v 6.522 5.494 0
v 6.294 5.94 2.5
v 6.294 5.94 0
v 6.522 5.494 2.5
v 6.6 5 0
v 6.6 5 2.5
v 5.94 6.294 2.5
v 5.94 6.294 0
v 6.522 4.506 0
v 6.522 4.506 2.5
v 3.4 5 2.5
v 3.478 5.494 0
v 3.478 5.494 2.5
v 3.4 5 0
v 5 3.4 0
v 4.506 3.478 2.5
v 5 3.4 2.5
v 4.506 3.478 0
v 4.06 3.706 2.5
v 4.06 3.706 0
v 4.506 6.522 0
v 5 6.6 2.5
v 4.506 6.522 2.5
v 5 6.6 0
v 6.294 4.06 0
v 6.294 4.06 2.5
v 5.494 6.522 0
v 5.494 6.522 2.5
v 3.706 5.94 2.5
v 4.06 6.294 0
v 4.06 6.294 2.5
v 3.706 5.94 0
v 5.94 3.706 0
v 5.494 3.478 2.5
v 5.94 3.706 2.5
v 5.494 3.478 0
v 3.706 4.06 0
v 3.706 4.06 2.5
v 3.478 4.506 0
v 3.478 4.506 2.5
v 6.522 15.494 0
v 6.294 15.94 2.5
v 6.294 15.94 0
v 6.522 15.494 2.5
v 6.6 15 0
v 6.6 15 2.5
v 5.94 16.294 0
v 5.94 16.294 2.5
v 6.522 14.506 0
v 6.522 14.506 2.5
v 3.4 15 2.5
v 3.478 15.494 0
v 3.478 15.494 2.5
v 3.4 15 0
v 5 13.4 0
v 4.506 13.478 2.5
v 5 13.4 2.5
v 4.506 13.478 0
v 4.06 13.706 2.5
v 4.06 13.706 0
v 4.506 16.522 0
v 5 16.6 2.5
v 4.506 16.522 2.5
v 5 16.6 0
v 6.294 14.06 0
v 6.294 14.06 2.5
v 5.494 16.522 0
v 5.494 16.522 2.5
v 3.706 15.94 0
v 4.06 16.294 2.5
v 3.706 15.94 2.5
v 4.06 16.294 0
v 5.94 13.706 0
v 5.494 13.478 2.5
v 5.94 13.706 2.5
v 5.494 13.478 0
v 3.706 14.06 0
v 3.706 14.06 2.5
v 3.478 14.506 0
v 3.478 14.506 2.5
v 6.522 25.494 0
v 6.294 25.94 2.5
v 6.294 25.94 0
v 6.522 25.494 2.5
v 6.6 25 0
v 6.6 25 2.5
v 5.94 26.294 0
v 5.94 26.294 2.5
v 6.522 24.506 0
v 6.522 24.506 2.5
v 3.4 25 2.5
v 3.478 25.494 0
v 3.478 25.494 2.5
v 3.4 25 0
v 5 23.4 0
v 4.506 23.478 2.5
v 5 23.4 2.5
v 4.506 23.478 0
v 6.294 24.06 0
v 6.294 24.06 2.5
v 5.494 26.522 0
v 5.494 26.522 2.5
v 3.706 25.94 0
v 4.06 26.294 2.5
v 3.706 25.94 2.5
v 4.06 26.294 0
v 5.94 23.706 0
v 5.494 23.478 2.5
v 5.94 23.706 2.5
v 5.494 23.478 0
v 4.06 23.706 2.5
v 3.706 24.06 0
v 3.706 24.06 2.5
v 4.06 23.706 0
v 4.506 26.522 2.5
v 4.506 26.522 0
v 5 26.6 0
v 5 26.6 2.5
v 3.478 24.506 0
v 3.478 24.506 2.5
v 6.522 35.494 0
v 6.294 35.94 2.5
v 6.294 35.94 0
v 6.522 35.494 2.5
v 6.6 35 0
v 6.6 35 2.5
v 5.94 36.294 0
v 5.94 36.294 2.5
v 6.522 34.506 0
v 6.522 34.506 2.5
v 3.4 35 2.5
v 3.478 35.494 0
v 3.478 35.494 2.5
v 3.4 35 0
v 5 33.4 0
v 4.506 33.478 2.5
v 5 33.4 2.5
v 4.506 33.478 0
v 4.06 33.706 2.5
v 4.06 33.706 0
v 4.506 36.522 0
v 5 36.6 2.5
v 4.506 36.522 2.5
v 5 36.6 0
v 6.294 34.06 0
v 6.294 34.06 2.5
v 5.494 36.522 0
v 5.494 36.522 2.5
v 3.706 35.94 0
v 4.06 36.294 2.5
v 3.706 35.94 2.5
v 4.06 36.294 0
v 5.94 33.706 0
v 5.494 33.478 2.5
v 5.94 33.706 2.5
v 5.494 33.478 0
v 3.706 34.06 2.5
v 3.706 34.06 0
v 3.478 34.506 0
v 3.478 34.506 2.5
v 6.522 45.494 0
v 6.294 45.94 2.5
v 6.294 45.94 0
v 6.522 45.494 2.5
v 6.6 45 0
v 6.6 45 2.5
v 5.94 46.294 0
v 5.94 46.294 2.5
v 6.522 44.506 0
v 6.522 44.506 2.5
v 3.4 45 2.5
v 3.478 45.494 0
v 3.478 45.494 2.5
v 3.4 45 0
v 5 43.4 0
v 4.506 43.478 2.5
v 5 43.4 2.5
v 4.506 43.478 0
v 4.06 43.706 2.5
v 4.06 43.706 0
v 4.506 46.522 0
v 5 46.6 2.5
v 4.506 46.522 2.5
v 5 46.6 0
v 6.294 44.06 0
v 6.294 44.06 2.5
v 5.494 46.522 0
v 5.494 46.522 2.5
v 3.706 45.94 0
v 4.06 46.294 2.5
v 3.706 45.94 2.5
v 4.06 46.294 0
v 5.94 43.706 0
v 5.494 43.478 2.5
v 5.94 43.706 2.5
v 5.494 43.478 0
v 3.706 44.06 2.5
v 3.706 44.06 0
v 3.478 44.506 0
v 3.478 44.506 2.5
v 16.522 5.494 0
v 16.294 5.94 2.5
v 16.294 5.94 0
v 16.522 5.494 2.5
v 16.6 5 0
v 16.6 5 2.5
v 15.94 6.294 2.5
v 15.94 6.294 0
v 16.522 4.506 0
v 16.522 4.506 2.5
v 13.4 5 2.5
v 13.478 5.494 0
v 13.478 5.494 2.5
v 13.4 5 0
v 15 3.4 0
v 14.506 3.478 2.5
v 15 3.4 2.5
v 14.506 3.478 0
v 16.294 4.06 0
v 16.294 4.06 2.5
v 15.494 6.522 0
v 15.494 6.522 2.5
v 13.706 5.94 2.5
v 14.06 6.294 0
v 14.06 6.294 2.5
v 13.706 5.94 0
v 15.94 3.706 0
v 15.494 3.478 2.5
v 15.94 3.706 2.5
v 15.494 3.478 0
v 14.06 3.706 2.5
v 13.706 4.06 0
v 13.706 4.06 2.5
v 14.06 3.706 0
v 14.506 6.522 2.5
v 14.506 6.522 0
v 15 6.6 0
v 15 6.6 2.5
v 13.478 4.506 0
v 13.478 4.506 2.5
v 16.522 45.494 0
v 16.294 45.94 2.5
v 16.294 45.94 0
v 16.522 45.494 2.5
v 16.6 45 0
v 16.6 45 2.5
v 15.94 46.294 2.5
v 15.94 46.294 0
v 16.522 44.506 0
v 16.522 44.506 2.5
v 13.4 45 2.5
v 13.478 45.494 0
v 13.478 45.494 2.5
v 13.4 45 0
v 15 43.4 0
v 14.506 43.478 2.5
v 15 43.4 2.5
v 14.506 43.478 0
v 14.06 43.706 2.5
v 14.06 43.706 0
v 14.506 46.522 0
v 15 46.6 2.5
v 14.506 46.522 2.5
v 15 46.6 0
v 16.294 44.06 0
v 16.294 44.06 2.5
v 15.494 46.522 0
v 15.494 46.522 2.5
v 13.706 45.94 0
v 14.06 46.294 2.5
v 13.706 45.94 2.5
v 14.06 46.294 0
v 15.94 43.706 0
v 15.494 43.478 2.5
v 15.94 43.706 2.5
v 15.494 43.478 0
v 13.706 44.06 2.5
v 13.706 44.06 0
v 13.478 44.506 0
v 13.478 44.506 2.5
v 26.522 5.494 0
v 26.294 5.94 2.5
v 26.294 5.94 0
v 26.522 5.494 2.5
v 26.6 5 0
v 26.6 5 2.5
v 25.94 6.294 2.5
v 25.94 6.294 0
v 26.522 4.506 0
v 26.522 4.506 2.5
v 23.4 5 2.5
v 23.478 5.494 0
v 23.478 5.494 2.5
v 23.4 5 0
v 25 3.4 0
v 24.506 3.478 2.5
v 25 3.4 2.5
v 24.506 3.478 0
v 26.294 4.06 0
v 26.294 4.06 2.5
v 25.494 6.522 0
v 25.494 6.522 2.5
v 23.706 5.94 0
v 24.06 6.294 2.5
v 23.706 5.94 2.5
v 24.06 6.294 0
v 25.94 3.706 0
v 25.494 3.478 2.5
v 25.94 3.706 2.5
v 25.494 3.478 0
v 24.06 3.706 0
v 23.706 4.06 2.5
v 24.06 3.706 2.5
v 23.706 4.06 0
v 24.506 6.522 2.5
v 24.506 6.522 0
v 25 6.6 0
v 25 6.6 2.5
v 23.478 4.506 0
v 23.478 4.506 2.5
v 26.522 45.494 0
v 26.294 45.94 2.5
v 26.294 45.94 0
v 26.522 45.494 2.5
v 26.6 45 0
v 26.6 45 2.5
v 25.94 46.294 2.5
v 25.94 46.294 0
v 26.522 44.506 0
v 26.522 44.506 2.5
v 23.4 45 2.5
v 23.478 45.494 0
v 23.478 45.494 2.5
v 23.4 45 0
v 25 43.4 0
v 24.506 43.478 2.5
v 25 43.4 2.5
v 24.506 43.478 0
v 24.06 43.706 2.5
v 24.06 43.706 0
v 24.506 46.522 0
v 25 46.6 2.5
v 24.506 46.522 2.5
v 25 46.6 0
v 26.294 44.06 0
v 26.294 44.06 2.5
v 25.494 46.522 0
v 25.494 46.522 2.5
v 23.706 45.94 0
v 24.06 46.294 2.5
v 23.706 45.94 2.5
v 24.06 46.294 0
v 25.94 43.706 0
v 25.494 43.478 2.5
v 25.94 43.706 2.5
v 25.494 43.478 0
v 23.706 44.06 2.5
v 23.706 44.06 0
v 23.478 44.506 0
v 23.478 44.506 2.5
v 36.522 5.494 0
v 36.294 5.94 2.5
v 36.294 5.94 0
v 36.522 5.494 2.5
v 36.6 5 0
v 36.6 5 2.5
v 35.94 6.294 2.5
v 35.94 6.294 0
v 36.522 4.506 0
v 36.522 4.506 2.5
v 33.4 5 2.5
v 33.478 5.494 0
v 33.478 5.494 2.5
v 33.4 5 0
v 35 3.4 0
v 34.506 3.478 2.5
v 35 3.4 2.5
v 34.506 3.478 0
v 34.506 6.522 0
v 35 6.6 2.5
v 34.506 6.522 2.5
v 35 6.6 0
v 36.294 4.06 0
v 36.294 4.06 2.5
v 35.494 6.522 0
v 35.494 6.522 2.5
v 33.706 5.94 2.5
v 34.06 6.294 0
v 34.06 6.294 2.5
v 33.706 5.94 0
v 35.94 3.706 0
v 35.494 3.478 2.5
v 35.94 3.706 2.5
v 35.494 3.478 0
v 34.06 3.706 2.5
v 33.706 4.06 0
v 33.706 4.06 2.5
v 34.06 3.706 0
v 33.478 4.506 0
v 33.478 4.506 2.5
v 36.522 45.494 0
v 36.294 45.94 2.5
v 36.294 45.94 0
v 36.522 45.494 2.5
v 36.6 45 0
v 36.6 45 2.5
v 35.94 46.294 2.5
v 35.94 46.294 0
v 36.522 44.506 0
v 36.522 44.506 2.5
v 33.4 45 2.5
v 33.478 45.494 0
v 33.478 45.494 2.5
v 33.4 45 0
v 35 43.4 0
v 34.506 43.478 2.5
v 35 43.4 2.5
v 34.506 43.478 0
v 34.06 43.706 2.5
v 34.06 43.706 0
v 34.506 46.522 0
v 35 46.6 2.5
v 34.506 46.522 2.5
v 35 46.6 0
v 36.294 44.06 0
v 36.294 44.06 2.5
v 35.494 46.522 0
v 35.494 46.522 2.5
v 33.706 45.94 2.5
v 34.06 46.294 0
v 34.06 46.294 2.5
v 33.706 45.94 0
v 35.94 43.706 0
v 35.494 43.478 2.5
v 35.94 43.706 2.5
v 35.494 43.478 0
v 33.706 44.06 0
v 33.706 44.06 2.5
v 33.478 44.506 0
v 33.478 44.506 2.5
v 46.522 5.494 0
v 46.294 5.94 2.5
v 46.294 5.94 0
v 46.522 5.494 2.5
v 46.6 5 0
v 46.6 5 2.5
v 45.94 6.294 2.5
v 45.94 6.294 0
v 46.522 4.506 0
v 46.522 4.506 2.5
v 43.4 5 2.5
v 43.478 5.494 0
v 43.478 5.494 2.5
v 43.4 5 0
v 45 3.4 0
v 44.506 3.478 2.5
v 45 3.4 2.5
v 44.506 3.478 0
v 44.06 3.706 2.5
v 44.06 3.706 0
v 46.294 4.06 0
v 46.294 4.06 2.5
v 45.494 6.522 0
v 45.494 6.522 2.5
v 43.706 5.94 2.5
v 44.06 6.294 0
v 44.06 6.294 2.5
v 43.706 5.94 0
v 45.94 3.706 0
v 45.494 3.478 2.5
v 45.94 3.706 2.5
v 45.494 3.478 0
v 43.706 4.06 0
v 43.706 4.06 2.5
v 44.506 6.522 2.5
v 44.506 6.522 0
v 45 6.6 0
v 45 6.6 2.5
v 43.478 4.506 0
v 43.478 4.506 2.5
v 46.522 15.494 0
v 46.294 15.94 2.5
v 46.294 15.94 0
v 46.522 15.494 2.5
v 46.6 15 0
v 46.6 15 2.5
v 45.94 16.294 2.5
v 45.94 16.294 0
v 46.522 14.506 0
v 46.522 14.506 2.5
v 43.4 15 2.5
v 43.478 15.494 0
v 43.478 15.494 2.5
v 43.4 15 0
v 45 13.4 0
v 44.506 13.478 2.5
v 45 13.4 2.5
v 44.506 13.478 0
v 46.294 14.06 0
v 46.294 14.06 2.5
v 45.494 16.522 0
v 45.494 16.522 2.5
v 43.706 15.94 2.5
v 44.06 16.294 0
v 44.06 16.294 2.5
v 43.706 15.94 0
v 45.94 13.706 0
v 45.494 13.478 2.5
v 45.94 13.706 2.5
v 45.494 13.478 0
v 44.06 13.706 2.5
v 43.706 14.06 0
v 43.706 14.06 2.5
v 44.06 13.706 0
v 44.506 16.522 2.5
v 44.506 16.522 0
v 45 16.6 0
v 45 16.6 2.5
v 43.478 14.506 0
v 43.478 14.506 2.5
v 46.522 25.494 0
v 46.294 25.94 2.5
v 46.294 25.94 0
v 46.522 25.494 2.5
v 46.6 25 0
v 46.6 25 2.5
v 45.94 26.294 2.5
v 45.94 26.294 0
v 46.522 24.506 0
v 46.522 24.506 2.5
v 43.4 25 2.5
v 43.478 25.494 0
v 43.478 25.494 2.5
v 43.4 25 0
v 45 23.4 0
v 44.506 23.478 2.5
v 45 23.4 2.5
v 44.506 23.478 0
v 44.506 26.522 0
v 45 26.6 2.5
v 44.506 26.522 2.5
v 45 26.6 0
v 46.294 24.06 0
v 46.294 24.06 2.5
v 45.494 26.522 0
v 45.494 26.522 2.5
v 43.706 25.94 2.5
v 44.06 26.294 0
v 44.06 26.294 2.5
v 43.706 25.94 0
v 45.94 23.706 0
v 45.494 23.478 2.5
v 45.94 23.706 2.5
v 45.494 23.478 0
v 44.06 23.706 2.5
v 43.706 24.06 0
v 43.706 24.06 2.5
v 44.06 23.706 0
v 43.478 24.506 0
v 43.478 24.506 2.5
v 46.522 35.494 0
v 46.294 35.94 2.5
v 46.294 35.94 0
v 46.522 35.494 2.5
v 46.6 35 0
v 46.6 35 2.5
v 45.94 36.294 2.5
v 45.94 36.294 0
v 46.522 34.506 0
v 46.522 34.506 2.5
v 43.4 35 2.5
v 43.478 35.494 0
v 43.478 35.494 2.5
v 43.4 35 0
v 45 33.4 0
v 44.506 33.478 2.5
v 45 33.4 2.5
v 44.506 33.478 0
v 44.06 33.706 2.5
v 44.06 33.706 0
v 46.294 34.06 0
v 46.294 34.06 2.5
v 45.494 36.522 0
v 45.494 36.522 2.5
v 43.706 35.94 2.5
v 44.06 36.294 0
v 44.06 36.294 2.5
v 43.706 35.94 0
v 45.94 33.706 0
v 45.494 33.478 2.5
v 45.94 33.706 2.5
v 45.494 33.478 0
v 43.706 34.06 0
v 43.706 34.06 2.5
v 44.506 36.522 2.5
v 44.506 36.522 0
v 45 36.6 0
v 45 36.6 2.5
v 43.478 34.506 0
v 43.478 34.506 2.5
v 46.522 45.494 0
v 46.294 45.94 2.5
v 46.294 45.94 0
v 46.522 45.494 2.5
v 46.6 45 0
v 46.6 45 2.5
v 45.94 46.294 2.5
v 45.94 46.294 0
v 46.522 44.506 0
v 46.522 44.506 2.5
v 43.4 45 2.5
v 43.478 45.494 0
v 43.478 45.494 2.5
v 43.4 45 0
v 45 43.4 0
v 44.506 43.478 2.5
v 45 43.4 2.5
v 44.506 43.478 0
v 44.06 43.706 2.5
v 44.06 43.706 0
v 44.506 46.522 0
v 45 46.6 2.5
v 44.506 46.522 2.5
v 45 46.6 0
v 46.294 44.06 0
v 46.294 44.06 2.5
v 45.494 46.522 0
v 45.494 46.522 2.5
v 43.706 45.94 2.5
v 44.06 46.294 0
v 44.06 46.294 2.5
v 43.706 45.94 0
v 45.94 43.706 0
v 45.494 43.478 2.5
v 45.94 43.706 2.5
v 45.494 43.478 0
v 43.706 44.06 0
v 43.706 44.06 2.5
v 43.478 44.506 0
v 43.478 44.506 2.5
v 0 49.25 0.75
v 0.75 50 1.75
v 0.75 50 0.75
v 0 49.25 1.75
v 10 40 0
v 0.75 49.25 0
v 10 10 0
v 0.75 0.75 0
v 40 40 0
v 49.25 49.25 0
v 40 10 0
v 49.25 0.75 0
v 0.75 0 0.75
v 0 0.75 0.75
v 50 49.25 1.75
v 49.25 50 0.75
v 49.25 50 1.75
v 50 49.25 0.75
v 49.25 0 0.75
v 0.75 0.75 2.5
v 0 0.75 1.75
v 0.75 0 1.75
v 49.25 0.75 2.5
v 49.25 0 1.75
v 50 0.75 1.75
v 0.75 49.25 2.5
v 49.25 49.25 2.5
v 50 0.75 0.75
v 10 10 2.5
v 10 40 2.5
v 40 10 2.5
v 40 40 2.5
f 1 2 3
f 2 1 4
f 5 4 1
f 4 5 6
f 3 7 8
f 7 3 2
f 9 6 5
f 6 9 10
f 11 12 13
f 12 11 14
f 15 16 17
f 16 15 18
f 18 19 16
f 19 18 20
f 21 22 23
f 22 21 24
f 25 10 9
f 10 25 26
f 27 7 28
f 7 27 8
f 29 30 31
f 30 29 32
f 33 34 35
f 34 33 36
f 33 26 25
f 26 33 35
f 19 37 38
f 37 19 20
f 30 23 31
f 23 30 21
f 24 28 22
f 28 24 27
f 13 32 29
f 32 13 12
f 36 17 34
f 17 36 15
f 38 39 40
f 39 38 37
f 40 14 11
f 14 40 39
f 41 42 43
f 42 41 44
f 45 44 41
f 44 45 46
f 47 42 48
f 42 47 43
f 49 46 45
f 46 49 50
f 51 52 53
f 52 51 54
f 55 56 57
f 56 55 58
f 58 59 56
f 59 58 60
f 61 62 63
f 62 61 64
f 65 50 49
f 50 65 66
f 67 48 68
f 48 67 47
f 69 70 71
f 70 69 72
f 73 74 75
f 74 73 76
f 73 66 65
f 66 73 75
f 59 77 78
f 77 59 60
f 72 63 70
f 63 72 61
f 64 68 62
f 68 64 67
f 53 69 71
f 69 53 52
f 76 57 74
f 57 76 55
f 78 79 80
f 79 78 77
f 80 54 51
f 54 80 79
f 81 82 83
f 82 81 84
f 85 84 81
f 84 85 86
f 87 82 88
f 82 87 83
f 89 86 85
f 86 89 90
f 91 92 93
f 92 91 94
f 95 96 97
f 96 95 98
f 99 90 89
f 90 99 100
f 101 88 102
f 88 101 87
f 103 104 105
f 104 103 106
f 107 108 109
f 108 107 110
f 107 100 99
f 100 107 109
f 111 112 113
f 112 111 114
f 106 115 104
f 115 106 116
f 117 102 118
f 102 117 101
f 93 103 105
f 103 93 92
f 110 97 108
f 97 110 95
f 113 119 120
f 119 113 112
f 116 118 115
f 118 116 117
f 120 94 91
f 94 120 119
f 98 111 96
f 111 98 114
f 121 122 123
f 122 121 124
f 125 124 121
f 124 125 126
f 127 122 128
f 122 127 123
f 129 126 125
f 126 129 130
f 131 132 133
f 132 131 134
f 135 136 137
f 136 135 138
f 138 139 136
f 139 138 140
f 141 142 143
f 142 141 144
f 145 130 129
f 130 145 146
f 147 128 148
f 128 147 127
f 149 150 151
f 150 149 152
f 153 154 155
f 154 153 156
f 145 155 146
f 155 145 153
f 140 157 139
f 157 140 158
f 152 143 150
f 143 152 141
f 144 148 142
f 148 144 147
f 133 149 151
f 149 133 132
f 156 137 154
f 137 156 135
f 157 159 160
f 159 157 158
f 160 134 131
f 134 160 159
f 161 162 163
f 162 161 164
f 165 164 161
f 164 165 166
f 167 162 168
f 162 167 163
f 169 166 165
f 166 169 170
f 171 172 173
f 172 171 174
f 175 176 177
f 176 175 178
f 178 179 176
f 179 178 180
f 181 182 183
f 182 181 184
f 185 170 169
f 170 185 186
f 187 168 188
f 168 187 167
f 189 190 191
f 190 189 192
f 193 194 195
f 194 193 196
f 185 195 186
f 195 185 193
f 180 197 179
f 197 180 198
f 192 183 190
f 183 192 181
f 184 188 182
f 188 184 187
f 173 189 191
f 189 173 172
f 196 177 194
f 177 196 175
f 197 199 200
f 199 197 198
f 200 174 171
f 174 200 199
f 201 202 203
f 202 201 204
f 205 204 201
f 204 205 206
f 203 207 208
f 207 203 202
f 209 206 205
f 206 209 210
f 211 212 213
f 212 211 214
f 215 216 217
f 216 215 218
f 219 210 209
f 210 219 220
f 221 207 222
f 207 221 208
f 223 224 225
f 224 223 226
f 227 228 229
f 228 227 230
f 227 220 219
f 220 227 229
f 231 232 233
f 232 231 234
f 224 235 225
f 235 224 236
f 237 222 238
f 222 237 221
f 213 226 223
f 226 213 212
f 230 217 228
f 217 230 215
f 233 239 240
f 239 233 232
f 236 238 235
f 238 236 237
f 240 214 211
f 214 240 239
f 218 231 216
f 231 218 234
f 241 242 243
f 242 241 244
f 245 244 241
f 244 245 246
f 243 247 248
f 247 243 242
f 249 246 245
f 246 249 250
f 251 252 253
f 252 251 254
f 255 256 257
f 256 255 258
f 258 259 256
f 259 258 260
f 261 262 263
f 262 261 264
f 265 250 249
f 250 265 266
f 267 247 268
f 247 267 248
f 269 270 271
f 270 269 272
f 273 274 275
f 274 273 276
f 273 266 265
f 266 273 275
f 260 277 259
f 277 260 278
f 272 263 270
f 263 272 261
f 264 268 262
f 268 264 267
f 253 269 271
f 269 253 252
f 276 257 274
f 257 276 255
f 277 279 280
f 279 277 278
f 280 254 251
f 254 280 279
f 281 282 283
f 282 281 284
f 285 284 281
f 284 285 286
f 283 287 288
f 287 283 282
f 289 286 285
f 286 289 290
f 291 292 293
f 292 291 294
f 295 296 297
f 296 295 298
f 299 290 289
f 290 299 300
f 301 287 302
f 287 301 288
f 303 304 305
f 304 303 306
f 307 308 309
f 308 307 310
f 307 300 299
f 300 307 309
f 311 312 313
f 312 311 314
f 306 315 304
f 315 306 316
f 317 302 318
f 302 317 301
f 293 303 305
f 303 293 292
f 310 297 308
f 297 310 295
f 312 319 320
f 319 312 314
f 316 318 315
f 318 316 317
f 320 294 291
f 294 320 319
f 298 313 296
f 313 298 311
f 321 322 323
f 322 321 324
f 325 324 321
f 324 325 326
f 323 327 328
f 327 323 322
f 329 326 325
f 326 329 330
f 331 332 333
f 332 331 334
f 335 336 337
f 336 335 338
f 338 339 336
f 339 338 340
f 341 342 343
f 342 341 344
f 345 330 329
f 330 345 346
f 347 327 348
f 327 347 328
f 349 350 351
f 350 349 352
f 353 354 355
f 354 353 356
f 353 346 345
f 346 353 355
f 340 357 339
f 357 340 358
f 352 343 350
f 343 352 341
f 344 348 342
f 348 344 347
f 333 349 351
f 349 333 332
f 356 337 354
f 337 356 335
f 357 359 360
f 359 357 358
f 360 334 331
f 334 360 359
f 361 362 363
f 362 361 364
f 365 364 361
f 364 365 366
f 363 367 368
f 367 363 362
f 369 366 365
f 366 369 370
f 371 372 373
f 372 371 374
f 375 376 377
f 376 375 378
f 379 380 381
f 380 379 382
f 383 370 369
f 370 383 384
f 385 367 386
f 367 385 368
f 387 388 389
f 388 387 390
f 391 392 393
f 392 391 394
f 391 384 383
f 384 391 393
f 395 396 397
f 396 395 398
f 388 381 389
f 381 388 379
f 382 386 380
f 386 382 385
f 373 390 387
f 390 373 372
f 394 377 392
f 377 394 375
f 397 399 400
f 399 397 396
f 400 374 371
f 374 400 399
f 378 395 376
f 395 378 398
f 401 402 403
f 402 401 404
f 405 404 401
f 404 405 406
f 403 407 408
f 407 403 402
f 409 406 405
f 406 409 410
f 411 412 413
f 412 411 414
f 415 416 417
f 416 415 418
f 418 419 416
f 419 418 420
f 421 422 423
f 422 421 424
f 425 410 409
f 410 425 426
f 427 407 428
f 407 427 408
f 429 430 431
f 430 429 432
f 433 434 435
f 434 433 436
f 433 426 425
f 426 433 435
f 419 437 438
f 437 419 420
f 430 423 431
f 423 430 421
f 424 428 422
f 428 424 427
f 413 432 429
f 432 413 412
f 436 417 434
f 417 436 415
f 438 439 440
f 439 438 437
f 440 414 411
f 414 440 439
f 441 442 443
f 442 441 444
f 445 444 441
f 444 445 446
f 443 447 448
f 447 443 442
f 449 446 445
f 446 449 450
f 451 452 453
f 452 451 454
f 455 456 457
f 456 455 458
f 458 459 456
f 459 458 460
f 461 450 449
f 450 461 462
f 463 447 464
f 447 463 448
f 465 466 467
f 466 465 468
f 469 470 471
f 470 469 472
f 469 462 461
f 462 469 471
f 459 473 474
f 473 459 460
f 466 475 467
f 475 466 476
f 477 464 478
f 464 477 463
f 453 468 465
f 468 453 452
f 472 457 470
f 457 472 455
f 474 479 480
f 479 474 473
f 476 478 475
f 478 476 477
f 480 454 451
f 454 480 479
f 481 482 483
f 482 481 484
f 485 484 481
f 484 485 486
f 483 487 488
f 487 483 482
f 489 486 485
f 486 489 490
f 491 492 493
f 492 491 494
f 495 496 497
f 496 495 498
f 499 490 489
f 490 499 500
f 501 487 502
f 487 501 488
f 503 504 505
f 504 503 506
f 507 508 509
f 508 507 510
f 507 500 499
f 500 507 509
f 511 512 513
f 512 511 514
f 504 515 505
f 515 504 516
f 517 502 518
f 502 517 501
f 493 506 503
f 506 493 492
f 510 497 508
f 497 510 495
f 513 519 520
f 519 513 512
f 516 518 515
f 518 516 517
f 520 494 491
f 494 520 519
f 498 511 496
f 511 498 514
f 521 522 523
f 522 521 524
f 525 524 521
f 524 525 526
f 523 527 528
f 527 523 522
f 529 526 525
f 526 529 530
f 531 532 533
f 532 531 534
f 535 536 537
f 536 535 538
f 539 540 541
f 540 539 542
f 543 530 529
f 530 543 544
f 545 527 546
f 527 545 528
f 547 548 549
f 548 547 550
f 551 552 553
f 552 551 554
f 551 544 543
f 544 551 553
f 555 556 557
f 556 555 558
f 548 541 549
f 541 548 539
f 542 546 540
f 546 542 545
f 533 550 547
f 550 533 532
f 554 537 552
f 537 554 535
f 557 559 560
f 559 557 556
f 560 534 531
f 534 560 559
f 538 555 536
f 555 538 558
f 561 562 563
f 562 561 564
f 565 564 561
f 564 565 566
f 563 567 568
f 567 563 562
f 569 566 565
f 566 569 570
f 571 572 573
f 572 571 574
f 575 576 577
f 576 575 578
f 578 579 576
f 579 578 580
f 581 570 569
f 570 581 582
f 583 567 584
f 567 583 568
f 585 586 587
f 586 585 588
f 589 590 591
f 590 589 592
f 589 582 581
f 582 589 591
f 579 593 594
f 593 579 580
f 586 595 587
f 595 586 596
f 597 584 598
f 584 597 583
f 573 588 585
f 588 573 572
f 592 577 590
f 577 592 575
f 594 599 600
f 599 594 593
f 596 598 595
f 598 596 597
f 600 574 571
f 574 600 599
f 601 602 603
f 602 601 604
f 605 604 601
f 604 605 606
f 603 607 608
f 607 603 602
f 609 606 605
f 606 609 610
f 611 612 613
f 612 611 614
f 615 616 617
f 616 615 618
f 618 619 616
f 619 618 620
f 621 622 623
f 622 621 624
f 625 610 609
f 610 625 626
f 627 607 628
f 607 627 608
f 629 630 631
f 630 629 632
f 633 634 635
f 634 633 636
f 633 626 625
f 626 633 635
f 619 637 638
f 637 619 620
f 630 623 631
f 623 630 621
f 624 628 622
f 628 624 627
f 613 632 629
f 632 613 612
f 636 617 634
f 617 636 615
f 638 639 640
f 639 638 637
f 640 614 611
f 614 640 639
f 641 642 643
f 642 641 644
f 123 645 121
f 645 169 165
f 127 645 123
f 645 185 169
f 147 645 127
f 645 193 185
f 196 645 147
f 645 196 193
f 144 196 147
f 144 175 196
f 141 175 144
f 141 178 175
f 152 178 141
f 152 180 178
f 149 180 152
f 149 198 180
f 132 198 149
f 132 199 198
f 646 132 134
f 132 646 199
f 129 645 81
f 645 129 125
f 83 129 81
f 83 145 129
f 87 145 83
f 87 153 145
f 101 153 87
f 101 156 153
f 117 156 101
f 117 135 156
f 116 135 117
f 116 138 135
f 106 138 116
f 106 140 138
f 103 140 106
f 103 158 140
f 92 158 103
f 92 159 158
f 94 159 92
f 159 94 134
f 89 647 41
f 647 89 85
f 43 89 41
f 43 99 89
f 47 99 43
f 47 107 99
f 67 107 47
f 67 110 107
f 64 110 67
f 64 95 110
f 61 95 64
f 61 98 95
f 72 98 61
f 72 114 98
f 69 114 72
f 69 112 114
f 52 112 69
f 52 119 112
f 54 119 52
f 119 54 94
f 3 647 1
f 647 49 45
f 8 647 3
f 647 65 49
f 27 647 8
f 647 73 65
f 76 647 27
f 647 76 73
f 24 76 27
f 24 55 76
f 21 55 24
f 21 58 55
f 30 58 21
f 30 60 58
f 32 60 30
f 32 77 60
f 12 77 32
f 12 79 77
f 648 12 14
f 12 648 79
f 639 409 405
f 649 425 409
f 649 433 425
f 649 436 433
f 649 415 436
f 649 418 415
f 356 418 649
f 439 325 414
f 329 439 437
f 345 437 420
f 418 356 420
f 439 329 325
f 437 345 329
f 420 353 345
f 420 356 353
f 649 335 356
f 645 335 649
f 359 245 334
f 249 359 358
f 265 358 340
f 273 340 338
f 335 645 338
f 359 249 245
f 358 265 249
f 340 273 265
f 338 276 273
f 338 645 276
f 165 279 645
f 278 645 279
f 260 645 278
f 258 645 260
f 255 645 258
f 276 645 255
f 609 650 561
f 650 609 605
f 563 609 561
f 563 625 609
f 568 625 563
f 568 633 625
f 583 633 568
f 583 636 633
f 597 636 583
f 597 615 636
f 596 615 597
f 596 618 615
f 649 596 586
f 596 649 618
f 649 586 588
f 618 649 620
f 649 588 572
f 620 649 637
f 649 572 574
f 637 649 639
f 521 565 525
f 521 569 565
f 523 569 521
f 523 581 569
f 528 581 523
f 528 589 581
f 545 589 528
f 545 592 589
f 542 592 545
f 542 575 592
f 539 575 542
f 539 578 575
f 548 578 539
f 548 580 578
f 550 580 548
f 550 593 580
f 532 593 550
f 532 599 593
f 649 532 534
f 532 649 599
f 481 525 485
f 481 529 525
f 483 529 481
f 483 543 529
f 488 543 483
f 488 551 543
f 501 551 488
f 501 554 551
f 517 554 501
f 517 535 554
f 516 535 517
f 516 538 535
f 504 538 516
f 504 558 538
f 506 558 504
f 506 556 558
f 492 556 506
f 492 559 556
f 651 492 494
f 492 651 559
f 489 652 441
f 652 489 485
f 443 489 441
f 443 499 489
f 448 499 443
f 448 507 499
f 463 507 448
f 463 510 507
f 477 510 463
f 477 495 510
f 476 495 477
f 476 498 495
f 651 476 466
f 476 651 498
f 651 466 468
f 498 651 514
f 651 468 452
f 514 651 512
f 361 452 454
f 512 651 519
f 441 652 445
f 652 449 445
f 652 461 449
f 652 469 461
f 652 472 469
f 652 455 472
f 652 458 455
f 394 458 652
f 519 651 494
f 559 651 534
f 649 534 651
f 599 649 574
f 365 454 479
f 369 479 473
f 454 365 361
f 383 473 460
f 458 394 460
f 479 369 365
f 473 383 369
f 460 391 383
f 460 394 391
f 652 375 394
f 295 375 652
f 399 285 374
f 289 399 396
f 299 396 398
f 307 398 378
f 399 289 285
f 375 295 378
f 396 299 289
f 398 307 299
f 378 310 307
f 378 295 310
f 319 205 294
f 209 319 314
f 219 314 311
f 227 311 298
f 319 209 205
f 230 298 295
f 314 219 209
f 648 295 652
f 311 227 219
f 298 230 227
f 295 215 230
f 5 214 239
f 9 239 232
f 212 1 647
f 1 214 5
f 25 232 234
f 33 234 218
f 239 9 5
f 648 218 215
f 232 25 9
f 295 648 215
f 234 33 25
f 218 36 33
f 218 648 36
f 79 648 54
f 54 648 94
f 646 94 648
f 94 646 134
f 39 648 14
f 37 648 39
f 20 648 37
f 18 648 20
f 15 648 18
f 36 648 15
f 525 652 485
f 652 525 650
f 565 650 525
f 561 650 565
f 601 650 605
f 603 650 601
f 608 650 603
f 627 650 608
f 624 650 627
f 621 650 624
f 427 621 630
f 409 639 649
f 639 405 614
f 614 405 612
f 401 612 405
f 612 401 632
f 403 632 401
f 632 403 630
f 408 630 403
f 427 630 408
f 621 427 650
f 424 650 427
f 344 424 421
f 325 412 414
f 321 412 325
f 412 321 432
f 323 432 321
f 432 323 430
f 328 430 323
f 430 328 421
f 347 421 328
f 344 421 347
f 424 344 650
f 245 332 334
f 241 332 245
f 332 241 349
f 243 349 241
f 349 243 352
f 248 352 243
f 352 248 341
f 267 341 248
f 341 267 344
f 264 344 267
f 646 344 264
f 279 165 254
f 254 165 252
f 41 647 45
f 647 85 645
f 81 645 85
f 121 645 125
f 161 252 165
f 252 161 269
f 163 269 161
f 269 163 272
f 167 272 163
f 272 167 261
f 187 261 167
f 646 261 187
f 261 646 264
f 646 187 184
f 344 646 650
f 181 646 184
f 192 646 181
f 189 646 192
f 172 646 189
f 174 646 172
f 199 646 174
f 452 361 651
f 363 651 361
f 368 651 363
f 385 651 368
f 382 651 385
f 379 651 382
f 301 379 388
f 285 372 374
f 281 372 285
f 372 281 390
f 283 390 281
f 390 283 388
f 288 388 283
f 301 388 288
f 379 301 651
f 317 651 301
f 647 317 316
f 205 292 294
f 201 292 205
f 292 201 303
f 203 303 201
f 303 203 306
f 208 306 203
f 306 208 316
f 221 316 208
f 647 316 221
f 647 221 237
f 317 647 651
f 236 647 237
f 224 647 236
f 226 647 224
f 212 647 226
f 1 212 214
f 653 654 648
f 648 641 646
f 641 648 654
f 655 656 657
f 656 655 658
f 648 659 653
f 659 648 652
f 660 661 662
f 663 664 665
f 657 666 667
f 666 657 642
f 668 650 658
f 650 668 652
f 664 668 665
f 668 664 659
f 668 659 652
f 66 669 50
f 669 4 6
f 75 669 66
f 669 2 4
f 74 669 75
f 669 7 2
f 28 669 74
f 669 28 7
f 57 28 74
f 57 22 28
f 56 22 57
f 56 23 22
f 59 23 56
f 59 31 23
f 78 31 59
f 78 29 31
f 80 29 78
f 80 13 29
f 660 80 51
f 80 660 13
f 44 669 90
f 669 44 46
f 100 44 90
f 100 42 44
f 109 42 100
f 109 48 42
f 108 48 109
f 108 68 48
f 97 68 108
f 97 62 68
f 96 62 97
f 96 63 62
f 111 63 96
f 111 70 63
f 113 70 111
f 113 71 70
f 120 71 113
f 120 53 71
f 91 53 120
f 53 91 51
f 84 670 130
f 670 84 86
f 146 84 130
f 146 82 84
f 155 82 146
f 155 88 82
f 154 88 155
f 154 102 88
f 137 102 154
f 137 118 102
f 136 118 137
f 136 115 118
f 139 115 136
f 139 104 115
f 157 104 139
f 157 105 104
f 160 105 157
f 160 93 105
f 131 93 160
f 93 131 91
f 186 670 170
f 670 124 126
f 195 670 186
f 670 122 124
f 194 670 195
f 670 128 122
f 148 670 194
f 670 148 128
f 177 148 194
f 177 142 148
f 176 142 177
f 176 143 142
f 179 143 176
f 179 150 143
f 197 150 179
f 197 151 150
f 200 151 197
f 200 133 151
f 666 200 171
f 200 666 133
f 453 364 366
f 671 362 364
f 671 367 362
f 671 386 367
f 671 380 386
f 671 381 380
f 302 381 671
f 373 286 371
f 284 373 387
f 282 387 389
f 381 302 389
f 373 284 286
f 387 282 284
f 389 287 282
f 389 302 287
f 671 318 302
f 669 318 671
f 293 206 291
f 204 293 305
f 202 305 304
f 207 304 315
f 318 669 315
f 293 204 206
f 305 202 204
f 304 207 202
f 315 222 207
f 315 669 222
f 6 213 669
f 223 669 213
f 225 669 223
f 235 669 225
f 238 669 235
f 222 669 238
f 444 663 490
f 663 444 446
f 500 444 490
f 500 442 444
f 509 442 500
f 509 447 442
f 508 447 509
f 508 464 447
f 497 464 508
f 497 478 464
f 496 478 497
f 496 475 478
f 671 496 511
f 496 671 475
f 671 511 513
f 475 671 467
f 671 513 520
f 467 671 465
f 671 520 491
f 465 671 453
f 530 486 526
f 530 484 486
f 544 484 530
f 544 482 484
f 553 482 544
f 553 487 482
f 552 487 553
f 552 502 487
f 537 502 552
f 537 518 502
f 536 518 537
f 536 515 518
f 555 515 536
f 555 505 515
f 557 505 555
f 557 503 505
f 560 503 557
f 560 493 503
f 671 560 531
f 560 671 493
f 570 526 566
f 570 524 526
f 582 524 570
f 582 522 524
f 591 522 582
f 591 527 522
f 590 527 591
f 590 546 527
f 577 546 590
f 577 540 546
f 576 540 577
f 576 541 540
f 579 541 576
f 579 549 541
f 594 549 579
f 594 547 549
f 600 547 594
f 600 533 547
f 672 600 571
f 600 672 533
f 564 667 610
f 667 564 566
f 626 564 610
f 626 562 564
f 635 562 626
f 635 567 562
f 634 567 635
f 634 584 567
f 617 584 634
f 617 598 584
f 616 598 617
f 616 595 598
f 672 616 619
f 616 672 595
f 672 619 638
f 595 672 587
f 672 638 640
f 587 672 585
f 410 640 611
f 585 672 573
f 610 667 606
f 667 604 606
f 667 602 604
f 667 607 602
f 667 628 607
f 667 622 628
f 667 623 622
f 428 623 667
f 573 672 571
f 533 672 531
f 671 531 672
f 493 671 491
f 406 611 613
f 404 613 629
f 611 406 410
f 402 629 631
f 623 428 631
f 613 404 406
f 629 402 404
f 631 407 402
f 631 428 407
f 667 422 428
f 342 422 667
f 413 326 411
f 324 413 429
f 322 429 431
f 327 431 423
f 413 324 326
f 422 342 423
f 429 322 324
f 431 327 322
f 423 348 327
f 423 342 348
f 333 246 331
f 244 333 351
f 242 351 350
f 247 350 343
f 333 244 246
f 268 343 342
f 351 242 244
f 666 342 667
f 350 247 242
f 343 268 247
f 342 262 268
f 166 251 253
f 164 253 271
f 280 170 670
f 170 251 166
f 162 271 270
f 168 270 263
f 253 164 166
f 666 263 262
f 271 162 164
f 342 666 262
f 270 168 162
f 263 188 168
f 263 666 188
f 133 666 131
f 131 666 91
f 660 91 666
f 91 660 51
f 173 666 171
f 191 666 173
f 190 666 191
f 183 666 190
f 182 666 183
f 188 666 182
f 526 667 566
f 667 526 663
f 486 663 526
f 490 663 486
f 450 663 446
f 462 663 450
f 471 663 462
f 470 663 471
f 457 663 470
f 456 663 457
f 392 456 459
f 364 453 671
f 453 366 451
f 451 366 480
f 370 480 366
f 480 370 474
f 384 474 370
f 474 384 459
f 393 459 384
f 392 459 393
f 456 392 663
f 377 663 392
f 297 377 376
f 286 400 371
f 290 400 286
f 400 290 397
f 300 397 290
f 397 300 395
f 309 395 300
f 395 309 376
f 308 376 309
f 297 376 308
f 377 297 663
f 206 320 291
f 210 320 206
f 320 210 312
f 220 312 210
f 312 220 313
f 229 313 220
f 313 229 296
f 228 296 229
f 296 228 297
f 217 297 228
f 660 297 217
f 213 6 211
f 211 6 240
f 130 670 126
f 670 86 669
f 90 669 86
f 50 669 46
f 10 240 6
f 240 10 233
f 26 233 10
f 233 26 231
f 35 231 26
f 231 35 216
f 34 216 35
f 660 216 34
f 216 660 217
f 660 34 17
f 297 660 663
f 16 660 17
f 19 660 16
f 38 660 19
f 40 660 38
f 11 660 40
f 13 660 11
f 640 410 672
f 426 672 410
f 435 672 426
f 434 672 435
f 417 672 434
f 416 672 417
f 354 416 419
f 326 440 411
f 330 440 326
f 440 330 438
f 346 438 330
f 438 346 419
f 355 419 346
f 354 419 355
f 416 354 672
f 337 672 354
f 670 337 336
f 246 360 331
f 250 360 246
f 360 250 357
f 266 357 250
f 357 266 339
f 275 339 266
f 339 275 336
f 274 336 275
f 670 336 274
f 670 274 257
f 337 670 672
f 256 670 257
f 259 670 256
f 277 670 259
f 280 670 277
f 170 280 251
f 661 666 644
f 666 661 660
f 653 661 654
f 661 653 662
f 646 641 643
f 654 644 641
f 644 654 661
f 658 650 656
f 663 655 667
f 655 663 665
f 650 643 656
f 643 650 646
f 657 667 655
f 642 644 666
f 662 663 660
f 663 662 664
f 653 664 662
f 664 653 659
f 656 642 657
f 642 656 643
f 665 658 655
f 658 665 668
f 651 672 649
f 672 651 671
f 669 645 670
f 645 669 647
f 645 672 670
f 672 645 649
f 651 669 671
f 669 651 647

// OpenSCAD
/*  
        Flat.scad
        M3Z core library 1.0.0
*/

//BEGIN OPTIONS - edit these parameters to generate custom parts of this form.

N = 5; //whole number of 10mm units along the X axis
M = 5; //whole number of 10mm units along the Y axis

THICKNESS = 2.5; //Nominal 2.5mm - thickness of the walls of the part

CHAMFER_DEPTH = 0.75; //Default 0.75mm

HOLE_DIAMETER = 3.2; //Nominal 3.0mm - common diameter of holes throughout

HOLE_FACES = 15; //Default 20 - higher number => slower render, smoother holes

//END OPTIONS - edit all else at your own risk

//Modules

module chamferCube(dimensions,depth){
    //where dimensions is a vector e.g. [10,20,30] and depth is the depth of the chamfer.
    
    f=2*depth;
    
    octaPoints = [ 
                    [1,0,0],
                    [0,1,0],
                    [-1,0,0],
                    [0,-1,0],
                    [0,0,1],
                    [0,0,-1]
                ];

    octaFaces = [   
                    [0,4,1],
                    [1,4,2],
                    [2,4,3],
                    [3,4,0],
                    [0,1,5],
                    [1,2,5],
                    [2,3,5],
                    [3,0,5] 
                ];
    translate([depth,depth,depth])
    minkowski(){
        cube([dimensions[0]-f,dimensions[1]-f,dimensions[2]-f]);
        polyhedron(octaPoints*depth, octaFaces);
    }
}

//variables (derived and not to be edited)

bodyWidth = N * 10;
bodyLength = M * 10;
bodyHeight = THICKNESS;
bodyDims = [bodyWidth,bodyLength,bodyHeight];

//Part Generating Code
difference(){
    chamferCube(bodyDims,CHAMFER_DEPTH);
    
    translate([10,10,-10])
    cube([bodyWidth-20, bodyLength-20, 50]);
    
    for(i = [0:N-1]){
        for(j = [0:M-1]){
            translate([5+(10*i),5+(10*j),0]){
                cylinder(h = 10, d = HOLE_DIAMETER, center = true, $fn = 20);
            }
        }
    }
}
